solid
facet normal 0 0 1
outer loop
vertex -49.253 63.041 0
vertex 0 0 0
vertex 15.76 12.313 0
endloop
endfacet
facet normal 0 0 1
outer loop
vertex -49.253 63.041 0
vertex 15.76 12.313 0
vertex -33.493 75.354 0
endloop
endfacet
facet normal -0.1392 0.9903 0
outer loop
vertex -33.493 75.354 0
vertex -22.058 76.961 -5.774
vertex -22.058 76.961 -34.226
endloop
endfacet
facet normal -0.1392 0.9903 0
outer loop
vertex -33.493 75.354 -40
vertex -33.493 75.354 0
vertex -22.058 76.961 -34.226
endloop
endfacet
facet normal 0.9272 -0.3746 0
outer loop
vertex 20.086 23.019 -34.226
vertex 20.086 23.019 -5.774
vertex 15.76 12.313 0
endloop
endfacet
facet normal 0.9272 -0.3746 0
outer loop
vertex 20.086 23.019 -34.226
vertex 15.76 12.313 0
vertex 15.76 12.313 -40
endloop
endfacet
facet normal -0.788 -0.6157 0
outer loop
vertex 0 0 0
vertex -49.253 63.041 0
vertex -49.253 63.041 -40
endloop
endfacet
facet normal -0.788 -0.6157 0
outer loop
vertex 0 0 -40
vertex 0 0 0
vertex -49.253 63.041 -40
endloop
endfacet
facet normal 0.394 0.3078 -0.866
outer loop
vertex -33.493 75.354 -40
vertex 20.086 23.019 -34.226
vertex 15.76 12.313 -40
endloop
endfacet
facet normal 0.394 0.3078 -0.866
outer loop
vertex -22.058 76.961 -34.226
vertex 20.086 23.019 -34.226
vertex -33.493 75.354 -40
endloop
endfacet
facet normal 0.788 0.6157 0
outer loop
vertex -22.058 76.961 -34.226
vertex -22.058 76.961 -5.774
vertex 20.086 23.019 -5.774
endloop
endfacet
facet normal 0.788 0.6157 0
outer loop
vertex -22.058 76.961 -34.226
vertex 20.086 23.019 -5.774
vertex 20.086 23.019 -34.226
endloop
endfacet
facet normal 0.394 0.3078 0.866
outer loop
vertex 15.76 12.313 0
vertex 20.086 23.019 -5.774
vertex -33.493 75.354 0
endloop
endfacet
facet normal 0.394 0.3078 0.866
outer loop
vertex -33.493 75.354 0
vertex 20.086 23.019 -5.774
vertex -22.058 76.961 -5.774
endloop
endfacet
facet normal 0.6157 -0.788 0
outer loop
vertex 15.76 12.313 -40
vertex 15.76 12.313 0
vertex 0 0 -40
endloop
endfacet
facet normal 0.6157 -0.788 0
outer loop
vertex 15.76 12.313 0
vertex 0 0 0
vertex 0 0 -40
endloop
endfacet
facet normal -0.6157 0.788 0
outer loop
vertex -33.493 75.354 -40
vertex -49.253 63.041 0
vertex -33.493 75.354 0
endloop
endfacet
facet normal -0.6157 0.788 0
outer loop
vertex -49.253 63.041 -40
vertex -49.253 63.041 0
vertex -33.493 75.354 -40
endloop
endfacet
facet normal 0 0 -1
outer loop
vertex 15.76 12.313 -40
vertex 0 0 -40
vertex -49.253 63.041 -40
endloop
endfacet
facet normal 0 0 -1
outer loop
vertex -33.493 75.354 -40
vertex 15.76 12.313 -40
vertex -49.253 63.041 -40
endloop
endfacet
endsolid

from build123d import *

# Parameters (mm, degrees)
SKETCH2_W             = 40
SKETCH2_H             = 80
BOSS_EXTRUDE1_DEPTH   = 30
CHAMFER1_SIZE         = 10
CHAMFER1_SIZE2        = 5.773502692
CHAMFER1_PART_2_SIZE  = 10
CHAMFER1_PART_2_SIZE2 = 5.773502692
CHAMFER1_PART_3_SIZE  = 10
CHAMFER1_PART_3_SIZE2 = 5.773502692
CHAMFER1_PART_4_SIZE  = 10
CHAMFER1_PART_4_SIZE2 = 5.773502692


with BuildPart() as part:
    # Sketch2 → Boss-Extrude1 (new body)
    with BuildSketch(Plane(origin=(0, 0, 0), x_dir=(0, 0, -1), z_dir=(0.788010754, 0.615661475, 0))):
        with Locations((20, 40)):
            Rectangle(SKETCH2_W, SKETCH2_H)
    extrude(amount=BOSS_EXTRUDE1_DEPTH)

    # Chamfer1
    chamfer1_edges = [part.edges().sort_by_distance(p)[0] for p in [
        (-0.986136405, 49.990274404, -40),
    ]]
    chamfer1_side = [part.faces().sort_by_distance(p)[0] for p in [
        (-12.806297709, 40.755352274, -40),
    ]]
    chamfer(chamfer1_edges, length=CHAMFER1_SIZE, length2=CHAMFER1_SIZE2, reference=chamfer1_side[0])

    # Chamfer1 part 2
    chamfer1_part_2_edges = [part.edges().sort_by_distance(p)[0] for p in [
        (-25.612595418, 81.510704548, -20),
    ]]
    chamfer1_part_2_side = [part.faces().sort_by_distance(p)[0] for p in [
        (-37.432756722, 72.275782418, -20),
    ]]
    chamfer(chamfer1_part_2_edges, length=CHAMFER1_PART_2_SIZE, length2=CHAMFER1_PART_2_SIZE2, reference=chamfer1_part_2_side[0])

    # Chamfer1 part 3
    chamfer1_part_3_edges = [part.edges().sort_by_distance(p)[0] for p in [
        (-0.986136405, 49.990274404, 0),
    ]]
    chamfer1_part_3_side = [part.faces().sort_by_distance(p)[0] for p in [
        (-12.806297709, 40.755352274, 0),
    ]]
    chamfer(chamfer1_part_3_edges, length=CHAMFER1_PART_3_SIZE, length2=CHAMFER1_PART_3_SIZE2, reference=chamfer1_part_3_side[0])

    # Chamfer1 part 4
    chamfer1_part_4_edges = [part.edges().sort_by_distance(p)[0] for p in [
        (23.640322608, 18.46984426, -20),
    ]]
    chamfer1_part_4_side = [part.faces().sort_by_distance(p)[0] for p in [
        (11.820161304, 9.23492213, -20),
    ]]
    chamfer(chamfer1_part_4_edges, length=CHAMFER1_PART_4_SIZE, length2=CHAMFER1_PART_4_SIZE2, reference=chamfer1_part_4_side[0])


solid = part.part
